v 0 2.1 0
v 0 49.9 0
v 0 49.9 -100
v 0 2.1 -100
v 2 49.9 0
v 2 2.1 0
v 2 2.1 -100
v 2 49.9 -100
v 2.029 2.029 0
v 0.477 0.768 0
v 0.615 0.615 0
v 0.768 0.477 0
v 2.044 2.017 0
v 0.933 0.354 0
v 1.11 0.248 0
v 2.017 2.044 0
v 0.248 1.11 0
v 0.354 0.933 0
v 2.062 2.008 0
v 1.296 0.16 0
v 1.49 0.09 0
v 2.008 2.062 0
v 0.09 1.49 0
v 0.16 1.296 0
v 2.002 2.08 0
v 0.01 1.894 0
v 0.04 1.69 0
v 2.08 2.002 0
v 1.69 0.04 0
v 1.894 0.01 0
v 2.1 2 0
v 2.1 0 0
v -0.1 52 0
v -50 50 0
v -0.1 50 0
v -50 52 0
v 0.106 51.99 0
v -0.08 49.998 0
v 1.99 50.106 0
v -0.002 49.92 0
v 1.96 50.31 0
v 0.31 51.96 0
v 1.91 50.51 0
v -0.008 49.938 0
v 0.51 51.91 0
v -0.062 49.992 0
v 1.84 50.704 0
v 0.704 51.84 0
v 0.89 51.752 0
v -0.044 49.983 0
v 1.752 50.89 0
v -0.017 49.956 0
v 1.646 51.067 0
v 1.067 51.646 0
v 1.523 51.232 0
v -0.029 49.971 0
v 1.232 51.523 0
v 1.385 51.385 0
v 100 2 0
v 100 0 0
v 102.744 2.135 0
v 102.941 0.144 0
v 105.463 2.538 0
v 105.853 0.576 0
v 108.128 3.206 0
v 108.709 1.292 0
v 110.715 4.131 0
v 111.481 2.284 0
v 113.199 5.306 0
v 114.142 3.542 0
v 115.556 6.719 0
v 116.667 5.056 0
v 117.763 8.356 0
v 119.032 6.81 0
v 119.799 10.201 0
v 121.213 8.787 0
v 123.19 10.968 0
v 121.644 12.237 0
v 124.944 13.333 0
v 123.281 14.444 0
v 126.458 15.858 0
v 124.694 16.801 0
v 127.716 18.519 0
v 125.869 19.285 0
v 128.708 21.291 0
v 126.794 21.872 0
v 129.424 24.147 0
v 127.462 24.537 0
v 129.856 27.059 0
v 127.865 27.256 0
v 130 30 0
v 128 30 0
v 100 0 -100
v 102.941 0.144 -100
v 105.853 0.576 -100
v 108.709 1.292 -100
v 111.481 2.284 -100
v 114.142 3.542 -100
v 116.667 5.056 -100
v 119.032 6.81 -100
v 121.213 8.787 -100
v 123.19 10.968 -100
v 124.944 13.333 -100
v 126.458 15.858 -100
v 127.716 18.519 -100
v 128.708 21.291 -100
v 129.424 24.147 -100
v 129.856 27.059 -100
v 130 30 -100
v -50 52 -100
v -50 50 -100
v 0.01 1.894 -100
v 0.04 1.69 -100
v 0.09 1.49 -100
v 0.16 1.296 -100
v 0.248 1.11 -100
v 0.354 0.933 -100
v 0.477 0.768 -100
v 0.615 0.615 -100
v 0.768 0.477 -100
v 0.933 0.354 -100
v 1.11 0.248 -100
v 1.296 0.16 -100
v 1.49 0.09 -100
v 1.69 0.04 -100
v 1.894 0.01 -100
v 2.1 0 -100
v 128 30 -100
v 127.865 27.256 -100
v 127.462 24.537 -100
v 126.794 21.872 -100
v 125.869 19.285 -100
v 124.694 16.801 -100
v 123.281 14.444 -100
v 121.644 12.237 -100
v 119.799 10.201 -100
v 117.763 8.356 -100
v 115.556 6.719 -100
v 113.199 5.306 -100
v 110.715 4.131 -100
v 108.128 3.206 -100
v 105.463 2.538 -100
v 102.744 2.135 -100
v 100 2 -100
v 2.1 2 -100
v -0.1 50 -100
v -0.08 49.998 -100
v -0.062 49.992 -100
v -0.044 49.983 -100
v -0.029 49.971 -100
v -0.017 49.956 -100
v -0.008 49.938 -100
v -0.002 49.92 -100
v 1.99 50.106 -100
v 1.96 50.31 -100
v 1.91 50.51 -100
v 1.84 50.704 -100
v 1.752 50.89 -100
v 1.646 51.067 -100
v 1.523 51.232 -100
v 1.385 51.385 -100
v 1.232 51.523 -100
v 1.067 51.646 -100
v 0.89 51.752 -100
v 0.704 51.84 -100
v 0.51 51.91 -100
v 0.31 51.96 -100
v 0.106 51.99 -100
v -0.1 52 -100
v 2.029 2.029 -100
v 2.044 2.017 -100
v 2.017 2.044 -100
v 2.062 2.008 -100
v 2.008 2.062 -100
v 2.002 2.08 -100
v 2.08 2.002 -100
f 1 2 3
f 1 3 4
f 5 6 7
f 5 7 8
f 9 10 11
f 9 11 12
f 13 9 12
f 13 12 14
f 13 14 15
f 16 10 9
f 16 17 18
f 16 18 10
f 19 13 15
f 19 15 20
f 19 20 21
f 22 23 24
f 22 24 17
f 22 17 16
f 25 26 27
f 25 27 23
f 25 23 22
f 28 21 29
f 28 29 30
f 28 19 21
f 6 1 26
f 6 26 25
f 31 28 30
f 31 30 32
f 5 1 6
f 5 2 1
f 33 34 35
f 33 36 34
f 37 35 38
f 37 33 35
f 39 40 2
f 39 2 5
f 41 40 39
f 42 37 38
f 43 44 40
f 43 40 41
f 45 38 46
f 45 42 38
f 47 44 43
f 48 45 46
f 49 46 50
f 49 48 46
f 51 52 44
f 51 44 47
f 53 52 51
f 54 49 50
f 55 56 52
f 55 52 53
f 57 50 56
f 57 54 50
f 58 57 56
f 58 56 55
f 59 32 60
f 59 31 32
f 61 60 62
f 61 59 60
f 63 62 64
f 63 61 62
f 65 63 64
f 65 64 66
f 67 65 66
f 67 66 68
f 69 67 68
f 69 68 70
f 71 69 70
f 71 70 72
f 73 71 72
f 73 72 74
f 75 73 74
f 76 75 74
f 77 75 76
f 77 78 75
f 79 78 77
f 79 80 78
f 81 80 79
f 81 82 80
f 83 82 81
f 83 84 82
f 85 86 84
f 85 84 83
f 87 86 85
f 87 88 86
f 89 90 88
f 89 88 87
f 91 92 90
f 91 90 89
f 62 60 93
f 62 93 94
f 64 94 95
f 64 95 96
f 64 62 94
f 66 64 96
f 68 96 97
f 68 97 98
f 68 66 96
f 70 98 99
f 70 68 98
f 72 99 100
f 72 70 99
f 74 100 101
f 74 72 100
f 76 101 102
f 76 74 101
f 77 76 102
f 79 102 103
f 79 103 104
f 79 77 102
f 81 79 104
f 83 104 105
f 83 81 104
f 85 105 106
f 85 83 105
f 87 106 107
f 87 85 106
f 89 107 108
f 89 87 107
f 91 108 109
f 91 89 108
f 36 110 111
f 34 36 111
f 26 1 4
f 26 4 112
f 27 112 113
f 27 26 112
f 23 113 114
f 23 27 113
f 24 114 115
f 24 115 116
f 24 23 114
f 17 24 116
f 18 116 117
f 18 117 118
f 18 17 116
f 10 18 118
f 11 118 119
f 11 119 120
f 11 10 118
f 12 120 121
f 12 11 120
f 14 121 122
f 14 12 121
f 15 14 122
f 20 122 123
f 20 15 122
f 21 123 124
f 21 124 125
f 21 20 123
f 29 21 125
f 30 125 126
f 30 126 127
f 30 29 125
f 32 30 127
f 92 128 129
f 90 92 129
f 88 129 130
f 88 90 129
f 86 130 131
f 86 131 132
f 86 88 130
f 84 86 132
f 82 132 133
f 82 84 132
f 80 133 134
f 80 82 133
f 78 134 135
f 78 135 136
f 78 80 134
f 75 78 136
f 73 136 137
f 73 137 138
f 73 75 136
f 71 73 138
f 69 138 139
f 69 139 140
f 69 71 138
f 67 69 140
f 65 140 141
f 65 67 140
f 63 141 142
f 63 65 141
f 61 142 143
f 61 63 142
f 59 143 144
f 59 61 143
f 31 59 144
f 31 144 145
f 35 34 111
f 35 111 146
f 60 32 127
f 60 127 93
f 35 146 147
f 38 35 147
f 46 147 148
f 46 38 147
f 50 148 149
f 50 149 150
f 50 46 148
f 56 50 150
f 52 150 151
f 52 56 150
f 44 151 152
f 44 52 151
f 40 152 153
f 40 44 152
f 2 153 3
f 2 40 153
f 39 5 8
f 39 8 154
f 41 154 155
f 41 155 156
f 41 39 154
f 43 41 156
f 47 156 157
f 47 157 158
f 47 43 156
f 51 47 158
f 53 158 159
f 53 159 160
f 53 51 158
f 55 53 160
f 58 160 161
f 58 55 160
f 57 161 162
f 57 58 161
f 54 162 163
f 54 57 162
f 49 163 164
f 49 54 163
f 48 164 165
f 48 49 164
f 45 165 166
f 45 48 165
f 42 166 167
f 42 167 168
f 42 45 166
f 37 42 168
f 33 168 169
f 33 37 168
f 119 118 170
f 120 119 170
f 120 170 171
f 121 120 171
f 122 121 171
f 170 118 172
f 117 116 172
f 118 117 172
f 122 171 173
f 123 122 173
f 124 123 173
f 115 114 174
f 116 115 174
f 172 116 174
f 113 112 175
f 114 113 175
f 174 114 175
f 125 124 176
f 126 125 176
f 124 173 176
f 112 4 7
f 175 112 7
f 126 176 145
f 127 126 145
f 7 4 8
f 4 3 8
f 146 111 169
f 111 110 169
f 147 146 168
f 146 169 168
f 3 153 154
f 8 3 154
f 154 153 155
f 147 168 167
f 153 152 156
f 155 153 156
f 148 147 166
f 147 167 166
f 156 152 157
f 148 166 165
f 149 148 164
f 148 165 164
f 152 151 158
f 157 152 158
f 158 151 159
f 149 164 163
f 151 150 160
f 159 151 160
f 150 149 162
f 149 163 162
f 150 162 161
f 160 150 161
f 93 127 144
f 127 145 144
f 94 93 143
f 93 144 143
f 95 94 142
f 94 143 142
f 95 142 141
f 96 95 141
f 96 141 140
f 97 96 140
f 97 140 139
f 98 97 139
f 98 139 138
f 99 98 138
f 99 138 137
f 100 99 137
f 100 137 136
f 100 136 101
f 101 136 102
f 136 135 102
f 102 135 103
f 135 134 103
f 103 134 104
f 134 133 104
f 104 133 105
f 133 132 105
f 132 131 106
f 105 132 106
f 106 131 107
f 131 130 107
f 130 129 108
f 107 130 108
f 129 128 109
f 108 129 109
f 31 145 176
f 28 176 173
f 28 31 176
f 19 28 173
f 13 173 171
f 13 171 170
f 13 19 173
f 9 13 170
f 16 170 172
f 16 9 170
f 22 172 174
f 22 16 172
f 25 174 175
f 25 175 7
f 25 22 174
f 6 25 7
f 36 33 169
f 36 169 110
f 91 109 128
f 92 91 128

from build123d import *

# Parameters (mm, degrees)
SM_BASE_FLANGE_1_DEPTH = 100


# Sheet-metal steps are written as plain solids
with BuildPart() as part:
    # Sketch 1 → 基体-法兰1 (new body)
    with BuildSketch(Plane.XY):
        with BuildLine():
            Line((-50, 50), (-0.1, 50))
            ThreePointArc((-0.1, 50), (-0.029289322, 49.970710678), (0, 49.9))
            Line((0, 49.9), (0, 2.1))
            ThreePointArc((0, 2.1), (0.61507576, 0.61507576), (2.1, 0))
            Line((2.1, 0), (100, 0))
            ThreePointArc((100, 0), (121.213203436, 8.786796564), (130, 30))
            Line((130, 30), (128, 30))
            ThreePointArc((128, 30), (119.798989873, 10.201010127), (100, 2))
            Line((100, 2), (2.1, 2))
            ThreePointArc((2.1, 2), (2.029289322, 2.029289322), (2, 2.1))
            Line((2, 2.1), (2, 49.9))
            ThreePointArc((2, 49.9), (1.384924241, 51.38492424), (-0.1, 52))
            Line((-0.1, 52), (-50, 52))
            Line((-50, 52), (-50, 50))
        make_face()
    extrude(amount=-SM_BASE_FLANGE_1_DEPTH)


solid = part.part
